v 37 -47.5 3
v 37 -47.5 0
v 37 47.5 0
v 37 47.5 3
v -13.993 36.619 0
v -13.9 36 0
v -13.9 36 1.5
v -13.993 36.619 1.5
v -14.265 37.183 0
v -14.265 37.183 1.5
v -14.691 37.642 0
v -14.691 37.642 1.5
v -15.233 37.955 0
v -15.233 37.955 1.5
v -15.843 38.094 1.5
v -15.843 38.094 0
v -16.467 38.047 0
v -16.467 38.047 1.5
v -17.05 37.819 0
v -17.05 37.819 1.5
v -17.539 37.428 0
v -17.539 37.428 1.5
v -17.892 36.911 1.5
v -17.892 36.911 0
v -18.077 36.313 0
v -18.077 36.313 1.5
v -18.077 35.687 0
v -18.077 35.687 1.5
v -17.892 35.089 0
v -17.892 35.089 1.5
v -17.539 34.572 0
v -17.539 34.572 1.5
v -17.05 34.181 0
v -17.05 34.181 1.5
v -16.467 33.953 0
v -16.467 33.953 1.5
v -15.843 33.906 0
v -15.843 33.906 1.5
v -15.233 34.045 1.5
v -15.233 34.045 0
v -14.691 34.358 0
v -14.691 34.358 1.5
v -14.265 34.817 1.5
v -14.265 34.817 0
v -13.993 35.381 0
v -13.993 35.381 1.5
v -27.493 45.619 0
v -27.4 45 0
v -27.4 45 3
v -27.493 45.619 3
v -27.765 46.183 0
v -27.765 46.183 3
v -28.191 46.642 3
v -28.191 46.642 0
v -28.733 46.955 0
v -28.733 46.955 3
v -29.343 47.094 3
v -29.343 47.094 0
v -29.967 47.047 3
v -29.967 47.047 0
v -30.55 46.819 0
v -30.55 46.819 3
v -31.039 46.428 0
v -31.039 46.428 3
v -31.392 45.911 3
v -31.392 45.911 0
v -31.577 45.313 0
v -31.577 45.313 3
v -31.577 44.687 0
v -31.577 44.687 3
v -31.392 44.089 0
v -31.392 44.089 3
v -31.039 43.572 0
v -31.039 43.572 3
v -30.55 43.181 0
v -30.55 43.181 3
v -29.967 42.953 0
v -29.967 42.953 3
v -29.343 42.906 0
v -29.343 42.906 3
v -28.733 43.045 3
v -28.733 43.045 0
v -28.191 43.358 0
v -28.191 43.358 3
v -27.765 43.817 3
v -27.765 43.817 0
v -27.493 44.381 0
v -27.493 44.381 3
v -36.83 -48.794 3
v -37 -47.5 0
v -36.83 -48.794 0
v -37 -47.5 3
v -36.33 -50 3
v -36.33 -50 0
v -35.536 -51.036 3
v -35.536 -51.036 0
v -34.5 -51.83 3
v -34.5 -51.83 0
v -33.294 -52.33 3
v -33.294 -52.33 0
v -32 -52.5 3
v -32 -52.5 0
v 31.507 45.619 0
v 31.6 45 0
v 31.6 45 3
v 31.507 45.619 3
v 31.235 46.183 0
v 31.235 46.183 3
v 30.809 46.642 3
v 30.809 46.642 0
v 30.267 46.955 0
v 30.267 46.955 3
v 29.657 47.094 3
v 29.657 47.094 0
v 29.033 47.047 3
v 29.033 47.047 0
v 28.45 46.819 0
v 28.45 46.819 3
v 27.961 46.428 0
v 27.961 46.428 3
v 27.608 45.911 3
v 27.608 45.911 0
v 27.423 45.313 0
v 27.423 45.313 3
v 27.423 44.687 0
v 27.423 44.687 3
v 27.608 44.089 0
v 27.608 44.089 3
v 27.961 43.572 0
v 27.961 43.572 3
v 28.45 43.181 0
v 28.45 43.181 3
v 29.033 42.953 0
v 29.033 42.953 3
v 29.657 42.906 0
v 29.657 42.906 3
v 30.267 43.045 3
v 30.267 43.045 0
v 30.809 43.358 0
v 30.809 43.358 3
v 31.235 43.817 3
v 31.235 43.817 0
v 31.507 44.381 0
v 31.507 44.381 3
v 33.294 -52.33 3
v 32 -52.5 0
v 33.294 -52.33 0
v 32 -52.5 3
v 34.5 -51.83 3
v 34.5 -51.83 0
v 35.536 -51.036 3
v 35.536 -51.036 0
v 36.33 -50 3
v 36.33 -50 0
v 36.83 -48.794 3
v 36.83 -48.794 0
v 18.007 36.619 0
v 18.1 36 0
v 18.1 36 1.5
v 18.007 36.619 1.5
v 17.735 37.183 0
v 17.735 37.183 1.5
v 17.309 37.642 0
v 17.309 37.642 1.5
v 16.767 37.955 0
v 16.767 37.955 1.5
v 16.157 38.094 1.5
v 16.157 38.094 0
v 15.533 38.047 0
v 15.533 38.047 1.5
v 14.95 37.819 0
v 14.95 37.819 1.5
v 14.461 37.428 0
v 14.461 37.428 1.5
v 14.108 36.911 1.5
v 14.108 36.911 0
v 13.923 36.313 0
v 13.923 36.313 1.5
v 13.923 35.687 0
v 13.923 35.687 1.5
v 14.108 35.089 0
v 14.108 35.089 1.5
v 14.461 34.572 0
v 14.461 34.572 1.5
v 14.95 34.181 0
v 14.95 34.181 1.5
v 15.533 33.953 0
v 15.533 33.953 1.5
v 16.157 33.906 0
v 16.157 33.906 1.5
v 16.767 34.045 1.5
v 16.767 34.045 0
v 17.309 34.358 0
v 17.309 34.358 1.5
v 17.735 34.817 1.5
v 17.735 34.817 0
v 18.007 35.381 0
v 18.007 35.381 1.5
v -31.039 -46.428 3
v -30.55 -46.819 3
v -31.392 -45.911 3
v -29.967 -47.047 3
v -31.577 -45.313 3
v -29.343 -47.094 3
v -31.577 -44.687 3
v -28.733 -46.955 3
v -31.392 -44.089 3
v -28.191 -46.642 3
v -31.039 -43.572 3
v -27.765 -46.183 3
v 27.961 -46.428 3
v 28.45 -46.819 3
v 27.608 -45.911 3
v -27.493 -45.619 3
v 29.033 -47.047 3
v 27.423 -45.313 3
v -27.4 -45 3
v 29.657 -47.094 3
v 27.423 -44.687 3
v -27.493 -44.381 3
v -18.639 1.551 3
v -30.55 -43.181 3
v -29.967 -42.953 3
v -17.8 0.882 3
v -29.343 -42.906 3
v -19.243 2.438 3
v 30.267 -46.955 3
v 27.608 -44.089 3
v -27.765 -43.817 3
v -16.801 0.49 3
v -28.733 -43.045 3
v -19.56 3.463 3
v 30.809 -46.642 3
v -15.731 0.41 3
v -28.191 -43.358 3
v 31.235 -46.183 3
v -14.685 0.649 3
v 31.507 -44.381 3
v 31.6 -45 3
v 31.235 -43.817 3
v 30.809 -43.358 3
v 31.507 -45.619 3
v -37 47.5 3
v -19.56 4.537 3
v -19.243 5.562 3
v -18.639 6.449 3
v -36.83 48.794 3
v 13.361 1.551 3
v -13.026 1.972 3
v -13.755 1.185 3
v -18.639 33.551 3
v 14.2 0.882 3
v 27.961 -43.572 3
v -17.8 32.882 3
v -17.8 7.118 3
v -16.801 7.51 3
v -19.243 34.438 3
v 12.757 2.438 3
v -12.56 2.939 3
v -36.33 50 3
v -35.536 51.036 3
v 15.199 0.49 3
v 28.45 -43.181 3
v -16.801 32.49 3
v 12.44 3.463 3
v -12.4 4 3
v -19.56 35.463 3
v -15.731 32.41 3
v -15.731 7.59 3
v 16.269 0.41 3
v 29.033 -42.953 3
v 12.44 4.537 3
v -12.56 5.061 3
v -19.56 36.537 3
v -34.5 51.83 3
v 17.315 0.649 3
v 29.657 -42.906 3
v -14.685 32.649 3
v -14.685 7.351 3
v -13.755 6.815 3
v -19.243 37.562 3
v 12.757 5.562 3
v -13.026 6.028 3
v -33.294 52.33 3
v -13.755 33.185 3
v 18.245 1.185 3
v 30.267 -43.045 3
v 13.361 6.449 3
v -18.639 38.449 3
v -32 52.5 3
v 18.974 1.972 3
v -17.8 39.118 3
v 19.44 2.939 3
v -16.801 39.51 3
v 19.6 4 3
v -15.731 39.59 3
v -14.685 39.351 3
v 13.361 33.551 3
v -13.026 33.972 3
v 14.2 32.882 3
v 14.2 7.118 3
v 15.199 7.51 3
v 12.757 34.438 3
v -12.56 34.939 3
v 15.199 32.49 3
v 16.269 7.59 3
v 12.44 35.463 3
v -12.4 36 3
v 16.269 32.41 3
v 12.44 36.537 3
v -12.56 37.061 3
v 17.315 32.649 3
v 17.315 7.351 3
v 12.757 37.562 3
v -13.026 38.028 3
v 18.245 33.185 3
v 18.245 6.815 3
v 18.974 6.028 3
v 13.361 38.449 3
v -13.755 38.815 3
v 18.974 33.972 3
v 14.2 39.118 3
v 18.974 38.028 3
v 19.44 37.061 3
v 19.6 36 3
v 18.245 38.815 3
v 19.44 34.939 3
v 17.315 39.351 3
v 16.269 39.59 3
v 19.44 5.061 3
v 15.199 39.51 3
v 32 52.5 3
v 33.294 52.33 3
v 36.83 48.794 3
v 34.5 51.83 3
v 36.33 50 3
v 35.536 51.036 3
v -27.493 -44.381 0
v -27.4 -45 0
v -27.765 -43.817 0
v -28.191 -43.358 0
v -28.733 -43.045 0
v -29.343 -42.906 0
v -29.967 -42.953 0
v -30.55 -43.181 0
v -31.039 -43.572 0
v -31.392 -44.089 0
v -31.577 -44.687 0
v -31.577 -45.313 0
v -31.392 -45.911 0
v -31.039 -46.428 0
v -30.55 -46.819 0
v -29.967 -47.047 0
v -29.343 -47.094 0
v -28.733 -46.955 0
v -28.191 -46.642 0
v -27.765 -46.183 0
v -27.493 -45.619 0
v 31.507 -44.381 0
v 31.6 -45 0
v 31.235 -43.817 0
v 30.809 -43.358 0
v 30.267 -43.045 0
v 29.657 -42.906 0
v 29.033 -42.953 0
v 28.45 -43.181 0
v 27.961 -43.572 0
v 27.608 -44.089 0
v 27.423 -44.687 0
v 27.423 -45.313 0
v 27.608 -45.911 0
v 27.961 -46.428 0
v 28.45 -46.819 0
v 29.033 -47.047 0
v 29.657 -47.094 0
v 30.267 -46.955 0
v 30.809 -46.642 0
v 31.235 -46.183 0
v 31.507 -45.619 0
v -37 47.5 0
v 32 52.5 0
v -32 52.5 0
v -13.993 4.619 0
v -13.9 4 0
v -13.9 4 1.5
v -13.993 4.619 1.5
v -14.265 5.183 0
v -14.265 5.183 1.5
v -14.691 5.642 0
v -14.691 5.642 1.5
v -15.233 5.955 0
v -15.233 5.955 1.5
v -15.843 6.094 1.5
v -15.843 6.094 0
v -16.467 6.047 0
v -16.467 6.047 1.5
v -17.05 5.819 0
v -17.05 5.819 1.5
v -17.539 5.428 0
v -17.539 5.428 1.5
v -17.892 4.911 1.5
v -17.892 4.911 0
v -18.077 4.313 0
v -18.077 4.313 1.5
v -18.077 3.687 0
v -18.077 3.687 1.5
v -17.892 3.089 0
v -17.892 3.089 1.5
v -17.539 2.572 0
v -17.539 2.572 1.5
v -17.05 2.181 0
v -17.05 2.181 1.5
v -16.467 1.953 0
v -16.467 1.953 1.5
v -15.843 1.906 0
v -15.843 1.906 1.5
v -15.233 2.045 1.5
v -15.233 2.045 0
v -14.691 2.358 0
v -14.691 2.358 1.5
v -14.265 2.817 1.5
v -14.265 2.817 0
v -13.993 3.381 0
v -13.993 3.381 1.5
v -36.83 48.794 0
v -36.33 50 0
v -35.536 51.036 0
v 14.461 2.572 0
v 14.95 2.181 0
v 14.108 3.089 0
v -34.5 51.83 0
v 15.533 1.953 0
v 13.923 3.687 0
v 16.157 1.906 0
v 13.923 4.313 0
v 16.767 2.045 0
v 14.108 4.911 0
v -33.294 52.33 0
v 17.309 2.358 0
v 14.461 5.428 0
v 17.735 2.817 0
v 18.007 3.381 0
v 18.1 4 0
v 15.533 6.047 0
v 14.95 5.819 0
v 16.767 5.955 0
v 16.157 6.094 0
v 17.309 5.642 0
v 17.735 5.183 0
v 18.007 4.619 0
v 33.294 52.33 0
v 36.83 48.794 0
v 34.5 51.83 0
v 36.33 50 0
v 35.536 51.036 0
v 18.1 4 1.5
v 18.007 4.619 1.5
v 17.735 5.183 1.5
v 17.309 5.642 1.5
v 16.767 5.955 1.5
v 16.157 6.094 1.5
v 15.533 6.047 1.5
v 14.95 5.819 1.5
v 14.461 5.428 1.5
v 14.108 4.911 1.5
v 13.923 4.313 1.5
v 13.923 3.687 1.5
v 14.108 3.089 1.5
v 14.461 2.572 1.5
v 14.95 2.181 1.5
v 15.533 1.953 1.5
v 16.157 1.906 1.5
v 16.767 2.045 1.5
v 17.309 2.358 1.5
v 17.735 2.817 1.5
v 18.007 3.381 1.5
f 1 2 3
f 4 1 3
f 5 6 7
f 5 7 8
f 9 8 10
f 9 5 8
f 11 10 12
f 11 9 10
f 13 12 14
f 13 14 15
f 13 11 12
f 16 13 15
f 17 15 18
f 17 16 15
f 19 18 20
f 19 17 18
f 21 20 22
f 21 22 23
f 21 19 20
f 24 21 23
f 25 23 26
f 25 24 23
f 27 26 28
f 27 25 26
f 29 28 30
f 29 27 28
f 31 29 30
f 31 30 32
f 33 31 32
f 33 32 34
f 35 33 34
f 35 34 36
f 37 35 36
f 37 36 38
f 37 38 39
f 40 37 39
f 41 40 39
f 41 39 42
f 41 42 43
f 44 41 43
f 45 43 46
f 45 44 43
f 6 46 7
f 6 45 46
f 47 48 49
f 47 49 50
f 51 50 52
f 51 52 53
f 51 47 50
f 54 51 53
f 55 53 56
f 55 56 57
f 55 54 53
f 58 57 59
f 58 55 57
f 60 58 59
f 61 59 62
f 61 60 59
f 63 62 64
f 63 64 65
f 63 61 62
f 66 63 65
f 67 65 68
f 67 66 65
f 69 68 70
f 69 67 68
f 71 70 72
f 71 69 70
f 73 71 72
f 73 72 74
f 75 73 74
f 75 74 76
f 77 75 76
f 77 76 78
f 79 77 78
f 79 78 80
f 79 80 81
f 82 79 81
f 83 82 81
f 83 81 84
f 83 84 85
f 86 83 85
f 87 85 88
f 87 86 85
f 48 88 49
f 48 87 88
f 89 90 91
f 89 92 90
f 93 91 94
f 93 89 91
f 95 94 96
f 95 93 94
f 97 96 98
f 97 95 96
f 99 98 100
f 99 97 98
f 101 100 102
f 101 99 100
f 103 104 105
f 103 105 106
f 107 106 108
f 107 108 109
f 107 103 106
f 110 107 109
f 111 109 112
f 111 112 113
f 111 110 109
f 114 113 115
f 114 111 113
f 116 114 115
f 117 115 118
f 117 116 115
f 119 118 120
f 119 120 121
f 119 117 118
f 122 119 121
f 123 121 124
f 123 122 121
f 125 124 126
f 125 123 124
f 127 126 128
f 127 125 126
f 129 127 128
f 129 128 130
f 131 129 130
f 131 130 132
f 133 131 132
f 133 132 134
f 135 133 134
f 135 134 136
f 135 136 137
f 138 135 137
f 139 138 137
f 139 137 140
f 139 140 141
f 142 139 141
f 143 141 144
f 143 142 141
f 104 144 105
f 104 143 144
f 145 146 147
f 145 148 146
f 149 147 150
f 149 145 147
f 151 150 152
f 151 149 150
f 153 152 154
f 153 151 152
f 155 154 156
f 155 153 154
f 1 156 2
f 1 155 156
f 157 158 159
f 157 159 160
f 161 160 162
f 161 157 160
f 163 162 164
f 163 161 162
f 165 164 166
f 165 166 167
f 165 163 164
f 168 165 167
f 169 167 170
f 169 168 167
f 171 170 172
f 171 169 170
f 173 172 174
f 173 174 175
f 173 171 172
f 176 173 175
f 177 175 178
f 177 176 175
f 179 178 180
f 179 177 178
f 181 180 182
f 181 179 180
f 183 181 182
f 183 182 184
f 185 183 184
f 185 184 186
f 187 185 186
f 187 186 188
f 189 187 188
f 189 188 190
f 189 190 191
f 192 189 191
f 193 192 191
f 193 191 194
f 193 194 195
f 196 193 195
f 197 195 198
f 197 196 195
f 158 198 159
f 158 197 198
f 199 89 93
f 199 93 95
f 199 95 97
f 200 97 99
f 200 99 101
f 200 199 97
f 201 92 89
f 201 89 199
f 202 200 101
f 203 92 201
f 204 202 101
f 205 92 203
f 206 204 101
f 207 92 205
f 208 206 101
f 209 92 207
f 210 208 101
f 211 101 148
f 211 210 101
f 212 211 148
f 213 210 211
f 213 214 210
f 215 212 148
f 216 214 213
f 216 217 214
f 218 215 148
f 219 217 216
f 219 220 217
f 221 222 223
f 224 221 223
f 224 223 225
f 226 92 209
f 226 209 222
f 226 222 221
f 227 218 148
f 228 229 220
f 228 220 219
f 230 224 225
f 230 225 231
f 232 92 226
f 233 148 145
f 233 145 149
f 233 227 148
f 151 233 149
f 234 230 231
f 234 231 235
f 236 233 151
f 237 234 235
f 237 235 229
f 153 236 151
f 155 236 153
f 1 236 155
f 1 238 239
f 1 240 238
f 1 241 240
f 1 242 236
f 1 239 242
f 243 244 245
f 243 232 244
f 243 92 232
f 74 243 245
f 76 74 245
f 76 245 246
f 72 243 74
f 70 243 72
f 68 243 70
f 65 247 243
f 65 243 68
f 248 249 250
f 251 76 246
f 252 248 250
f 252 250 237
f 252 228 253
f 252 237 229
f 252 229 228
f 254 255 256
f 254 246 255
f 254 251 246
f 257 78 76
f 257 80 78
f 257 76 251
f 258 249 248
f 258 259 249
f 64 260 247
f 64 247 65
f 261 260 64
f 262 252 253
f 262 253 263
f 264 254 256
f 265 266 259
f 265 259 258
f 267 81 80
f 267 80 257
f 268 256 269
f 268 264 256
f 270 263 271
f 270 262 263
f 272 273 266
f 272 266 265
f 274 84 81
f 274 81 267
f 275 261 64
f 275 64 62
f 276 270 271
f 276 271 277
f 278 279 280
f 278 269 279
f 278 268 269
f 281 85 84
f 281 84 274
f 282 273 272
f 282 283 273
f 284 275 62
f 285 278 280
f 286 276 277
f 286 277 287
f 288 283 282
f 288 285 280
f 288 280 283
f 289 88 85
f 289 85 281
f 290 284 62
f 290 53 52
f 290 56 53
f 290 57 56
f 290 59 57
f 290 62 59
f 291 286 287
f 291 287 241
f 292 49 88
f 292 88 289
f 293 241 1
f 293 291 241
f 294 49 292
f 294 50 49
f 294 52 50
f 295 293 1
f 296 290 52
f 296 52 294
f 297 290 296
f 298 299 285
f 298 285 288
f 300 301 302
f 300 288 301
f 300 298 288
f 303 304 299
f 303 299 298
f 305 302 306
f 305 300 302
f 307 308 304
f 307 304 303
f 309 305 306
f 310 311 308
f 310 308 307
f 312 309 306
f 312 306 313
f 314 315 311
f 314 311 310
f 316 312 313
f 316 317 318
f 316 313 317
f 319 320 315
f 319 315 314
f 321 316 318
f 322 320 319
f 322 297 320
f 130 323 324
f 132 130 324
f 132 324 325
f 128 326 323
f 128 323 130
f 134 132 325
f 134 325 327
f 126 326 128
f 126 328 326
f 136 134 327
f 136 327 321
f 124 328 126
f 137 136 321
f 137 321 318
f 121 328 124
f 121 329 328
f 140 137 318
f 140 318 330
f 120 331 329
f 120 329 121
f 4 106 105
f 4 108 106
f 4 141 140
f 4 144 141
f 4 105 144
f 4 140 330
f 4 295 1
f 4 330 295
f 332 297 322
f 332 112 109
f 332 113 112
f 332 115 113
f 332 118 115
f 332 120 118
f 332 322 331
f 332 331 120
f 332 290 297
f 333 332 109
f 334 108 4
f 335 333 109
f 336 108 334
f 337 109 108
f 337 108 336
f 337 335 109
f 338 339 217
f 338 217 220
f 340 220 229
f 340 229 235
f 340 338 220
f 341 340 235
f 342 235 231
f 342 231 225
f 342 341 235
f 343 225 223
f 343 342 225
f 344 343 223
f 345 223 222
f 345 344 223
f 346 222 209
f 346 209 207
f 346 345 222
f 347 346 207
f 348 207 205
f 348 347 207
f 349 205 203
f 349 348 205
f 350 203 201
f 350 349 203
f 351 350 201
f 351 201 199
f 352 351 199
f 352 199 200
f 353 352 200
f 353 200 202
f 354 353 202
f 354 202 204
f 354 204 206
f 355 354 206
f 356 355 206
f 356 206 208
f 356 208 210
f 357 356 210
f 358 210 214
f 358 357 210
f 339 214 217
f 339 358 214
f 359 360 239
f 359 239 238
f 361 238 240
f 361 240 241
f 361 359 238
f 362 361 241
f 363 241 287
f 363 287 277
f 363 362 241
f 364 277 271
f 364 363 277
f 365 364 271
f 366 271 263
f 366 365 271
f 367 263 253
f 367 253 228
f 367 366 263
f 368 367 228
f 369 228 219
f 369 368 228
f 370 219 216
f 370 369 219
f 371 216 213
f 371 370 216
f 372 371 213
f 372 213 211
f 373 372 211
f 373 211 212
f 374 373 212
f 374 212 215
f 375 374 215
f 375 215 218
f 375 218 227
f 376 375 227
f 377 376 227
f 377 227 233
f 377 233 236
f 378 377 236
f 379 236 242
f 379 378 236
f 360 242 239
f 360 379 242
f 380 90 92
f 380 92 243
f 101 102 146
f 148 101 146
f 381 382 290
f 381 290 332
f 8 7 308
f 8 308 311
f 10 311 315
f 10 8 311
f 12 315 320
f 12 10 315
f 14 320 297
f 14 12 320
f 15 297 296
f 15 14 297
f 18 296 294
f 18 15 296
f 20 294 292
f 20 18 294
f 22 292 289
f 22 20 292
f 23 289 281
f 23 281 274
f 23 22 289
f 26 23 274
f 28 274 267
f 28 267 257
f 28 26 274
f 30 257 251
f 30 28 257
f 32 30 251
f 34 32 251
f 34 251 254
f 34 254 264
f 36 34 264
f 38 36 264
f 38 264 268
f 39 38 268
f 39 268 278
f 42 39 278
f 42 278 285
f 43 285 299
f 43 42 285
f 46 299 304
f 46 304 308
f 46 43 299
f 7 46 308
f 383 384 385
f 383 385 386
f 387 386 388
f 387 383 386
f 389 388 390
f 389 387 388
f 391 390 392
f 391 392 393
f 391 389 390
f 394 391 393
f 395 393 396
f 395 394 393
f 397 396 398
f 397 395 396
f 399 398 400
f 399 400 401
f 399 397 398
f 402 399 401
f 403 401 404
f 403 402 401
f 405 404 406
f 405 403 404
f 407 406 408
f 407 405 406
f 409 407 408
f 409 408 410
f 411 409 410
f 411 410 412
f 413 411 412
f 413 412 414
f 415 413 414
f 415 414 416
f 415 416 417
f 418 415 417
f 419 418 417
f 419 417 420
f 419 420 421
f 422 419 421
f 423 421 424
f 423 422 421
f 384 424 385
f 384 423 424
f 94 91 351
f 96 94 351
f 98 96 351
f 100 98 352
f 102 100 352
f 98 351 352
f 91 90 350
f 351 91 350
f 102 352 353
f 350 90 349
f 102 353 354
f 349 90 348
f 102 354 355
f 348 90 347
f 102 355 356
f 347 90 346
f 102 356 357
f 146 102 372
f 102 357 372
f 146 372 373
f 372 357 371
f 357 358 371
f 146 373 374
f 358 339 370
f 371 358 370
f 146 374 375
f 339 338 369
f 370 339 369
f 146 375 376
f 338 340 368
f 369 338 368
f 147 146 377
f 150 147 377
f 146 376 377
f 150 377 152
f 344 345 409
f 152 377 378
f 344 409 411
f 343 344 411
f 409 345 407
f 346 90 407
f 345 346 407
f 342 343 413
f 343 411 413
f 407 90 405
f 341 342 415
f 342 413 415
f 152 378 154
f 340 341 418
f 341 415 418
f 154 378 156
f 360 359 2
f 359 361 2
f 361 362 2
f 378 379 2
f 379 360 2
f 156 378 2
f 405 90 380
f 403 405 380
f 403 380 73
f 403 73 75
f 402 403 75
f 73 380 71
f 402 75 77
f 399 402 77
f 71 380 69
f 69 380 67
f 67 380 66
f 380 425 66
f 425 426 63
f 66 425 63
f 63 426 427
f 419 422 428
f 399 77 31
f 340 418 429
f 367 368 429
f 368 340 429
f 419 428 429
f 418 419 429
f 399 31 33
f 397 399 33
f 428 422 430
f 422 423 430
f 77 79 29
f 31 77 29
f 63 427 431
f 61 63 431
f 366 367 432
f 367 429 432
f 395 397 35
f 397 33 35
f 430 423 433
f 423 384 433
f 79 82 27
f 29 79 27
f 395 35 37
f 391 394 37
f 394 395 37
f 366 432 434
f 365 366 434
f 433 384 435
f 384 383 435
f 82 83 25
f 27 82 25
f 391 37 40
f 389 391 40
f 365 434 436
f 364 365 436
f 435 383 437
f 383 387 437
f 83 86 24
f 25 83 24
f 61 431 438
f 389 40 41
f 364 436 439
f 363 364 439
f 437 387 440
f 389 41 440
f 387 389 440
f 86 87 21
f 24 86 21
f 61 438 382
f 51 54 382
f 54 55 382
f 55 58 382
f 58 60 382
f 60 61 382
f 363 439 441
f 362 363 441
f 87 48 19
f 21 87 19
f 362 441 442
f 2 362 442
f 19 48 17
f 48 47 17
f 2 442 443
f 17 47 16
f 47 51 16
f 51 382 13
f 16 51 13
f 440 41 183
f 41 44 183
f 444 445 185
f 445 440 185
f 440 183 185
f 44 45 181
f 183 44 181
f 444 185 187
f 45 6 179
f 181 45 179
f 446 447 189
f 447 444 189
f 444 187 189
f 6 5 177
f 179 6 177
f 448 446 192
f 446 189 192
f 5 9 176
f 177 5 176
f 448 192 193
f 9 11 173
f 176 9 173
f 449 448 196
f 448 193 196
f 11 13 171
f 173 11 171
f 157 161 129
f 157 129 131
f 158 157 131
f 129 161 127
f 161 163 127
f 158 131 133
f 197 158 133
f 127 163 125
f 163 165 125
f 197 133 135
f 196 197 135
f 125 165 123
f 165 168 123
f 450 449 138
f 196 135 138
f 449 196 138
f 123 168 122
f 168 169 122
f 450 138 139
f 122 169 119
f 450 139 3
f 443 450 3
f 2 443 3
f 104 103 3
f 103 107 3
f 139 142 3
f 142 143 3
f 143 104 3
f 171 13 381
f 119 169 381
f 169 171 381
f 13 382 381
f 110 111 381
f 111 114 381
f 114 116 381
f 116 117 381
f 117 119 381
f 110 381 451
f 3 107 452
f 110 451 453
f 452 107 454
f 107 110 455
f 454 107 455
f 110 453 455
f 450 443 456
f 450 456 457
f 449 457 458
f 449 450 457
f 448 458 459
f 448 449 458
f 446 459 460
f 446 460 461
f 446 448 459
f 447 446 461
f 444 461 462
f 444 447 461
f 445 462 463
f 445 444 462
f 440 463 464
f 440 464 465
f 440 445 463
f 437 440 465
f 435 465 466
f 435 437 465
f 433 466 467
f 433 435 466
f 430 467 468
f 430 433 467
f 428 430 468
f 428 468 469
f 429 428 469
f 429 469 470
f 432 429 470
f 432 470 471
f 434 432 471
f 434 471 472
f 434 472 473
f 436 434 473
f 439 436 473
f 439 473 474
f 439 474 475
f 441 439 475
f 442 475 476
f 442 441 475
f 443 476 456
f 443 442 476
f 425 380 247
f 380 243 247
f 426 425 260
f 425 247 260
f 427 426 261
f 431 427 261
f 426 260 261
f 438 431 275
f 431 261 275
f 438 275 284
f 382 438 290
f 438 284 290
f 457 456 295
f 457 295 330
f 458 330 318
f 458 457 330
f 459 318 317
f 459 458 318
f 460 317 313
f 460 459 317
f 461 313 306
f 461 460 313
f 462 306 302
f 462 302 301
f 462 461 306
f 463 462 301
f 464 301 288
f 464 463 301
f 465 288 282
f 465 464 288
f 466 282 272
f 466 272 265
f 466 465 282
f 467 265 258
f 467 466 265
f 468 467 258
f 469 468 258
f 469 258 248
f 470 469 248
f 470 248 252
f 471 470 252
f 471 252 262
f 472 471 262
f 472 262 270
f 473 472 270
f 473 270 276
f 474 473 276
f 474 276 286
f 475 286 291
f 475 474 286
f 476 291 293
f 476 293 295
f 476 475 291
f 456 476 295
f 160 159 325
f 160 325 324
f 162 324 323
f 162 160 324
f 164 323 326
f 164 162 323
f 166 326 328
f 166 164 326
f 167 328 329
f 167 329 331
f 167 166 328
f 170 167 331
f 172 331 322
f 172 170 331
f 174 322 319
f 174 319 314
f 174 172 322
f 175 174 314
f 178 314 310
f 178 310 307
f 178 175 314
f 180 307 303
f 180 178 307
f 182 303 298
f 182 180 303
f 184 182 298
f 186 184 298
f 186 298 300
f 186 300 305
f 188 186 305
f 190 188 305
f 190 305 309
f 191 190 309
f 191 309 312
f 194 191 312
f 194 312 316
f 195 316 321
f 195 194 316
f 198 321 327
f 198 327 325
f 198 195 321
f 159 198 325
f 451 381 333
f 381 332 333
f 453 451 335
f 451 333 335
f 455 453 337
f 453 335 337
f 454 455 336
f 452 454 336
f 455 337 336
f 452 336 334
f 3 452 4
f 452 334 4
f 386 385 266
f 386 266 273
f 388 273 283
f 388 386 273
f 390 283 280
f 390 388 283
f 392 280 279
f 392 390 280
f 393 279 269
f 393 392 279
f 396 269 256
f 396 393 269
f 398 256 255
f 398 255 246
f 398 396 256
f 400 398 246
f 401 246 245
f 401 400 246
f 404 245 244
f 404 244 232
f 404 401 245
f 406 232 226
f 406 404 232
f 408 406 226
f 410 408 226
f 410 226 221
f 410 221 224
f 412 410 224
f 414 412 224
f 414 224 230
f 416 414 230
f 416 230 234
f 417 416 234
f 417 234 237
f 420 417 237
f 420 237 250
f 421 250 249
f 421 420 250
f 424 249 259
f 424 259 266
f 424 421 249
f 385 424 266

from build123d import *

# Parameters (mm, degrees)
SKETCH_1_W      = 74
SKETCH_1_H      = 105
SKETCH_1_R      = 2.1
EXTRUDE_1_DEPTH = 3
FILLET_1_R      = 5
CHAMFER_1_SIZE  = 1.5


with BuildPart() as part:
    # ｽｹｯﾁ1 → ﾎﾞｽ - 押し出し1 (new body)
    with BuildSketch(Plane.XY):
        Rectangle(SKETCH_1_W, SKETCH_1_H)
        with Locations((-16, 36)):
            Circle(SKETCH_1_R, mode=Mode.SUBTRACT)
        with Locations((16, 36)):
            Circle(SKETCH_1_R, mode=Mode.SUBTRACT)
        with Locations((-16, 4)):
            Circle(SKETCH_1_R, mode=Mode.SUBTRACT)
        with Locations((16, 4)):
            Circle(SKETCH_1_R, mode=Mode.SUBTRACT)
        with Locations((-29.5, 45)):
            Circle(SKETCH_1_R, mode=Mode.SUBTRACT)
        with Locations((-29.5, -45)):
            Circle(SKETCH_1_R, mode=Mode.SUBTRACT)
        with Locations((29.5, 45)):
            Circle(SKETCH_1_R, mode=Mode.SUBTRACT)
        with Locations((29.5, -45)):
            Circle(SKETCH_1_R, mode=Mode.SUBTRACT)
    extrude(amount=EXTRUDE_1_DEPTH)

    # ﾌｨﾚｯﾄ1
    fillet_1_edges = [part.edges().sort_by_distance(p)[0] for p in [
        (37, -52.5, 1.5),
        (-37, -52.5, 1.5),
        (-37, 52.5, 1.5),
        (37, 52.5, 1.5),
    ]]
    fillet(fillet_1_edges, radius=FILLET_1_R)

    # 面取り1
    chamfer_1_edges = [part.edges().sort_by_distance(p)[0] for p in [
        (-18.1, 36, 3),
        (13.9, 36, 3),
        (-18.1, 4, 3),
        (13.9, 4, 3),
    ]]
    chamfer(chamfer_1_edges, length=CHAMFER_1_SIZE)


solid = part.part
